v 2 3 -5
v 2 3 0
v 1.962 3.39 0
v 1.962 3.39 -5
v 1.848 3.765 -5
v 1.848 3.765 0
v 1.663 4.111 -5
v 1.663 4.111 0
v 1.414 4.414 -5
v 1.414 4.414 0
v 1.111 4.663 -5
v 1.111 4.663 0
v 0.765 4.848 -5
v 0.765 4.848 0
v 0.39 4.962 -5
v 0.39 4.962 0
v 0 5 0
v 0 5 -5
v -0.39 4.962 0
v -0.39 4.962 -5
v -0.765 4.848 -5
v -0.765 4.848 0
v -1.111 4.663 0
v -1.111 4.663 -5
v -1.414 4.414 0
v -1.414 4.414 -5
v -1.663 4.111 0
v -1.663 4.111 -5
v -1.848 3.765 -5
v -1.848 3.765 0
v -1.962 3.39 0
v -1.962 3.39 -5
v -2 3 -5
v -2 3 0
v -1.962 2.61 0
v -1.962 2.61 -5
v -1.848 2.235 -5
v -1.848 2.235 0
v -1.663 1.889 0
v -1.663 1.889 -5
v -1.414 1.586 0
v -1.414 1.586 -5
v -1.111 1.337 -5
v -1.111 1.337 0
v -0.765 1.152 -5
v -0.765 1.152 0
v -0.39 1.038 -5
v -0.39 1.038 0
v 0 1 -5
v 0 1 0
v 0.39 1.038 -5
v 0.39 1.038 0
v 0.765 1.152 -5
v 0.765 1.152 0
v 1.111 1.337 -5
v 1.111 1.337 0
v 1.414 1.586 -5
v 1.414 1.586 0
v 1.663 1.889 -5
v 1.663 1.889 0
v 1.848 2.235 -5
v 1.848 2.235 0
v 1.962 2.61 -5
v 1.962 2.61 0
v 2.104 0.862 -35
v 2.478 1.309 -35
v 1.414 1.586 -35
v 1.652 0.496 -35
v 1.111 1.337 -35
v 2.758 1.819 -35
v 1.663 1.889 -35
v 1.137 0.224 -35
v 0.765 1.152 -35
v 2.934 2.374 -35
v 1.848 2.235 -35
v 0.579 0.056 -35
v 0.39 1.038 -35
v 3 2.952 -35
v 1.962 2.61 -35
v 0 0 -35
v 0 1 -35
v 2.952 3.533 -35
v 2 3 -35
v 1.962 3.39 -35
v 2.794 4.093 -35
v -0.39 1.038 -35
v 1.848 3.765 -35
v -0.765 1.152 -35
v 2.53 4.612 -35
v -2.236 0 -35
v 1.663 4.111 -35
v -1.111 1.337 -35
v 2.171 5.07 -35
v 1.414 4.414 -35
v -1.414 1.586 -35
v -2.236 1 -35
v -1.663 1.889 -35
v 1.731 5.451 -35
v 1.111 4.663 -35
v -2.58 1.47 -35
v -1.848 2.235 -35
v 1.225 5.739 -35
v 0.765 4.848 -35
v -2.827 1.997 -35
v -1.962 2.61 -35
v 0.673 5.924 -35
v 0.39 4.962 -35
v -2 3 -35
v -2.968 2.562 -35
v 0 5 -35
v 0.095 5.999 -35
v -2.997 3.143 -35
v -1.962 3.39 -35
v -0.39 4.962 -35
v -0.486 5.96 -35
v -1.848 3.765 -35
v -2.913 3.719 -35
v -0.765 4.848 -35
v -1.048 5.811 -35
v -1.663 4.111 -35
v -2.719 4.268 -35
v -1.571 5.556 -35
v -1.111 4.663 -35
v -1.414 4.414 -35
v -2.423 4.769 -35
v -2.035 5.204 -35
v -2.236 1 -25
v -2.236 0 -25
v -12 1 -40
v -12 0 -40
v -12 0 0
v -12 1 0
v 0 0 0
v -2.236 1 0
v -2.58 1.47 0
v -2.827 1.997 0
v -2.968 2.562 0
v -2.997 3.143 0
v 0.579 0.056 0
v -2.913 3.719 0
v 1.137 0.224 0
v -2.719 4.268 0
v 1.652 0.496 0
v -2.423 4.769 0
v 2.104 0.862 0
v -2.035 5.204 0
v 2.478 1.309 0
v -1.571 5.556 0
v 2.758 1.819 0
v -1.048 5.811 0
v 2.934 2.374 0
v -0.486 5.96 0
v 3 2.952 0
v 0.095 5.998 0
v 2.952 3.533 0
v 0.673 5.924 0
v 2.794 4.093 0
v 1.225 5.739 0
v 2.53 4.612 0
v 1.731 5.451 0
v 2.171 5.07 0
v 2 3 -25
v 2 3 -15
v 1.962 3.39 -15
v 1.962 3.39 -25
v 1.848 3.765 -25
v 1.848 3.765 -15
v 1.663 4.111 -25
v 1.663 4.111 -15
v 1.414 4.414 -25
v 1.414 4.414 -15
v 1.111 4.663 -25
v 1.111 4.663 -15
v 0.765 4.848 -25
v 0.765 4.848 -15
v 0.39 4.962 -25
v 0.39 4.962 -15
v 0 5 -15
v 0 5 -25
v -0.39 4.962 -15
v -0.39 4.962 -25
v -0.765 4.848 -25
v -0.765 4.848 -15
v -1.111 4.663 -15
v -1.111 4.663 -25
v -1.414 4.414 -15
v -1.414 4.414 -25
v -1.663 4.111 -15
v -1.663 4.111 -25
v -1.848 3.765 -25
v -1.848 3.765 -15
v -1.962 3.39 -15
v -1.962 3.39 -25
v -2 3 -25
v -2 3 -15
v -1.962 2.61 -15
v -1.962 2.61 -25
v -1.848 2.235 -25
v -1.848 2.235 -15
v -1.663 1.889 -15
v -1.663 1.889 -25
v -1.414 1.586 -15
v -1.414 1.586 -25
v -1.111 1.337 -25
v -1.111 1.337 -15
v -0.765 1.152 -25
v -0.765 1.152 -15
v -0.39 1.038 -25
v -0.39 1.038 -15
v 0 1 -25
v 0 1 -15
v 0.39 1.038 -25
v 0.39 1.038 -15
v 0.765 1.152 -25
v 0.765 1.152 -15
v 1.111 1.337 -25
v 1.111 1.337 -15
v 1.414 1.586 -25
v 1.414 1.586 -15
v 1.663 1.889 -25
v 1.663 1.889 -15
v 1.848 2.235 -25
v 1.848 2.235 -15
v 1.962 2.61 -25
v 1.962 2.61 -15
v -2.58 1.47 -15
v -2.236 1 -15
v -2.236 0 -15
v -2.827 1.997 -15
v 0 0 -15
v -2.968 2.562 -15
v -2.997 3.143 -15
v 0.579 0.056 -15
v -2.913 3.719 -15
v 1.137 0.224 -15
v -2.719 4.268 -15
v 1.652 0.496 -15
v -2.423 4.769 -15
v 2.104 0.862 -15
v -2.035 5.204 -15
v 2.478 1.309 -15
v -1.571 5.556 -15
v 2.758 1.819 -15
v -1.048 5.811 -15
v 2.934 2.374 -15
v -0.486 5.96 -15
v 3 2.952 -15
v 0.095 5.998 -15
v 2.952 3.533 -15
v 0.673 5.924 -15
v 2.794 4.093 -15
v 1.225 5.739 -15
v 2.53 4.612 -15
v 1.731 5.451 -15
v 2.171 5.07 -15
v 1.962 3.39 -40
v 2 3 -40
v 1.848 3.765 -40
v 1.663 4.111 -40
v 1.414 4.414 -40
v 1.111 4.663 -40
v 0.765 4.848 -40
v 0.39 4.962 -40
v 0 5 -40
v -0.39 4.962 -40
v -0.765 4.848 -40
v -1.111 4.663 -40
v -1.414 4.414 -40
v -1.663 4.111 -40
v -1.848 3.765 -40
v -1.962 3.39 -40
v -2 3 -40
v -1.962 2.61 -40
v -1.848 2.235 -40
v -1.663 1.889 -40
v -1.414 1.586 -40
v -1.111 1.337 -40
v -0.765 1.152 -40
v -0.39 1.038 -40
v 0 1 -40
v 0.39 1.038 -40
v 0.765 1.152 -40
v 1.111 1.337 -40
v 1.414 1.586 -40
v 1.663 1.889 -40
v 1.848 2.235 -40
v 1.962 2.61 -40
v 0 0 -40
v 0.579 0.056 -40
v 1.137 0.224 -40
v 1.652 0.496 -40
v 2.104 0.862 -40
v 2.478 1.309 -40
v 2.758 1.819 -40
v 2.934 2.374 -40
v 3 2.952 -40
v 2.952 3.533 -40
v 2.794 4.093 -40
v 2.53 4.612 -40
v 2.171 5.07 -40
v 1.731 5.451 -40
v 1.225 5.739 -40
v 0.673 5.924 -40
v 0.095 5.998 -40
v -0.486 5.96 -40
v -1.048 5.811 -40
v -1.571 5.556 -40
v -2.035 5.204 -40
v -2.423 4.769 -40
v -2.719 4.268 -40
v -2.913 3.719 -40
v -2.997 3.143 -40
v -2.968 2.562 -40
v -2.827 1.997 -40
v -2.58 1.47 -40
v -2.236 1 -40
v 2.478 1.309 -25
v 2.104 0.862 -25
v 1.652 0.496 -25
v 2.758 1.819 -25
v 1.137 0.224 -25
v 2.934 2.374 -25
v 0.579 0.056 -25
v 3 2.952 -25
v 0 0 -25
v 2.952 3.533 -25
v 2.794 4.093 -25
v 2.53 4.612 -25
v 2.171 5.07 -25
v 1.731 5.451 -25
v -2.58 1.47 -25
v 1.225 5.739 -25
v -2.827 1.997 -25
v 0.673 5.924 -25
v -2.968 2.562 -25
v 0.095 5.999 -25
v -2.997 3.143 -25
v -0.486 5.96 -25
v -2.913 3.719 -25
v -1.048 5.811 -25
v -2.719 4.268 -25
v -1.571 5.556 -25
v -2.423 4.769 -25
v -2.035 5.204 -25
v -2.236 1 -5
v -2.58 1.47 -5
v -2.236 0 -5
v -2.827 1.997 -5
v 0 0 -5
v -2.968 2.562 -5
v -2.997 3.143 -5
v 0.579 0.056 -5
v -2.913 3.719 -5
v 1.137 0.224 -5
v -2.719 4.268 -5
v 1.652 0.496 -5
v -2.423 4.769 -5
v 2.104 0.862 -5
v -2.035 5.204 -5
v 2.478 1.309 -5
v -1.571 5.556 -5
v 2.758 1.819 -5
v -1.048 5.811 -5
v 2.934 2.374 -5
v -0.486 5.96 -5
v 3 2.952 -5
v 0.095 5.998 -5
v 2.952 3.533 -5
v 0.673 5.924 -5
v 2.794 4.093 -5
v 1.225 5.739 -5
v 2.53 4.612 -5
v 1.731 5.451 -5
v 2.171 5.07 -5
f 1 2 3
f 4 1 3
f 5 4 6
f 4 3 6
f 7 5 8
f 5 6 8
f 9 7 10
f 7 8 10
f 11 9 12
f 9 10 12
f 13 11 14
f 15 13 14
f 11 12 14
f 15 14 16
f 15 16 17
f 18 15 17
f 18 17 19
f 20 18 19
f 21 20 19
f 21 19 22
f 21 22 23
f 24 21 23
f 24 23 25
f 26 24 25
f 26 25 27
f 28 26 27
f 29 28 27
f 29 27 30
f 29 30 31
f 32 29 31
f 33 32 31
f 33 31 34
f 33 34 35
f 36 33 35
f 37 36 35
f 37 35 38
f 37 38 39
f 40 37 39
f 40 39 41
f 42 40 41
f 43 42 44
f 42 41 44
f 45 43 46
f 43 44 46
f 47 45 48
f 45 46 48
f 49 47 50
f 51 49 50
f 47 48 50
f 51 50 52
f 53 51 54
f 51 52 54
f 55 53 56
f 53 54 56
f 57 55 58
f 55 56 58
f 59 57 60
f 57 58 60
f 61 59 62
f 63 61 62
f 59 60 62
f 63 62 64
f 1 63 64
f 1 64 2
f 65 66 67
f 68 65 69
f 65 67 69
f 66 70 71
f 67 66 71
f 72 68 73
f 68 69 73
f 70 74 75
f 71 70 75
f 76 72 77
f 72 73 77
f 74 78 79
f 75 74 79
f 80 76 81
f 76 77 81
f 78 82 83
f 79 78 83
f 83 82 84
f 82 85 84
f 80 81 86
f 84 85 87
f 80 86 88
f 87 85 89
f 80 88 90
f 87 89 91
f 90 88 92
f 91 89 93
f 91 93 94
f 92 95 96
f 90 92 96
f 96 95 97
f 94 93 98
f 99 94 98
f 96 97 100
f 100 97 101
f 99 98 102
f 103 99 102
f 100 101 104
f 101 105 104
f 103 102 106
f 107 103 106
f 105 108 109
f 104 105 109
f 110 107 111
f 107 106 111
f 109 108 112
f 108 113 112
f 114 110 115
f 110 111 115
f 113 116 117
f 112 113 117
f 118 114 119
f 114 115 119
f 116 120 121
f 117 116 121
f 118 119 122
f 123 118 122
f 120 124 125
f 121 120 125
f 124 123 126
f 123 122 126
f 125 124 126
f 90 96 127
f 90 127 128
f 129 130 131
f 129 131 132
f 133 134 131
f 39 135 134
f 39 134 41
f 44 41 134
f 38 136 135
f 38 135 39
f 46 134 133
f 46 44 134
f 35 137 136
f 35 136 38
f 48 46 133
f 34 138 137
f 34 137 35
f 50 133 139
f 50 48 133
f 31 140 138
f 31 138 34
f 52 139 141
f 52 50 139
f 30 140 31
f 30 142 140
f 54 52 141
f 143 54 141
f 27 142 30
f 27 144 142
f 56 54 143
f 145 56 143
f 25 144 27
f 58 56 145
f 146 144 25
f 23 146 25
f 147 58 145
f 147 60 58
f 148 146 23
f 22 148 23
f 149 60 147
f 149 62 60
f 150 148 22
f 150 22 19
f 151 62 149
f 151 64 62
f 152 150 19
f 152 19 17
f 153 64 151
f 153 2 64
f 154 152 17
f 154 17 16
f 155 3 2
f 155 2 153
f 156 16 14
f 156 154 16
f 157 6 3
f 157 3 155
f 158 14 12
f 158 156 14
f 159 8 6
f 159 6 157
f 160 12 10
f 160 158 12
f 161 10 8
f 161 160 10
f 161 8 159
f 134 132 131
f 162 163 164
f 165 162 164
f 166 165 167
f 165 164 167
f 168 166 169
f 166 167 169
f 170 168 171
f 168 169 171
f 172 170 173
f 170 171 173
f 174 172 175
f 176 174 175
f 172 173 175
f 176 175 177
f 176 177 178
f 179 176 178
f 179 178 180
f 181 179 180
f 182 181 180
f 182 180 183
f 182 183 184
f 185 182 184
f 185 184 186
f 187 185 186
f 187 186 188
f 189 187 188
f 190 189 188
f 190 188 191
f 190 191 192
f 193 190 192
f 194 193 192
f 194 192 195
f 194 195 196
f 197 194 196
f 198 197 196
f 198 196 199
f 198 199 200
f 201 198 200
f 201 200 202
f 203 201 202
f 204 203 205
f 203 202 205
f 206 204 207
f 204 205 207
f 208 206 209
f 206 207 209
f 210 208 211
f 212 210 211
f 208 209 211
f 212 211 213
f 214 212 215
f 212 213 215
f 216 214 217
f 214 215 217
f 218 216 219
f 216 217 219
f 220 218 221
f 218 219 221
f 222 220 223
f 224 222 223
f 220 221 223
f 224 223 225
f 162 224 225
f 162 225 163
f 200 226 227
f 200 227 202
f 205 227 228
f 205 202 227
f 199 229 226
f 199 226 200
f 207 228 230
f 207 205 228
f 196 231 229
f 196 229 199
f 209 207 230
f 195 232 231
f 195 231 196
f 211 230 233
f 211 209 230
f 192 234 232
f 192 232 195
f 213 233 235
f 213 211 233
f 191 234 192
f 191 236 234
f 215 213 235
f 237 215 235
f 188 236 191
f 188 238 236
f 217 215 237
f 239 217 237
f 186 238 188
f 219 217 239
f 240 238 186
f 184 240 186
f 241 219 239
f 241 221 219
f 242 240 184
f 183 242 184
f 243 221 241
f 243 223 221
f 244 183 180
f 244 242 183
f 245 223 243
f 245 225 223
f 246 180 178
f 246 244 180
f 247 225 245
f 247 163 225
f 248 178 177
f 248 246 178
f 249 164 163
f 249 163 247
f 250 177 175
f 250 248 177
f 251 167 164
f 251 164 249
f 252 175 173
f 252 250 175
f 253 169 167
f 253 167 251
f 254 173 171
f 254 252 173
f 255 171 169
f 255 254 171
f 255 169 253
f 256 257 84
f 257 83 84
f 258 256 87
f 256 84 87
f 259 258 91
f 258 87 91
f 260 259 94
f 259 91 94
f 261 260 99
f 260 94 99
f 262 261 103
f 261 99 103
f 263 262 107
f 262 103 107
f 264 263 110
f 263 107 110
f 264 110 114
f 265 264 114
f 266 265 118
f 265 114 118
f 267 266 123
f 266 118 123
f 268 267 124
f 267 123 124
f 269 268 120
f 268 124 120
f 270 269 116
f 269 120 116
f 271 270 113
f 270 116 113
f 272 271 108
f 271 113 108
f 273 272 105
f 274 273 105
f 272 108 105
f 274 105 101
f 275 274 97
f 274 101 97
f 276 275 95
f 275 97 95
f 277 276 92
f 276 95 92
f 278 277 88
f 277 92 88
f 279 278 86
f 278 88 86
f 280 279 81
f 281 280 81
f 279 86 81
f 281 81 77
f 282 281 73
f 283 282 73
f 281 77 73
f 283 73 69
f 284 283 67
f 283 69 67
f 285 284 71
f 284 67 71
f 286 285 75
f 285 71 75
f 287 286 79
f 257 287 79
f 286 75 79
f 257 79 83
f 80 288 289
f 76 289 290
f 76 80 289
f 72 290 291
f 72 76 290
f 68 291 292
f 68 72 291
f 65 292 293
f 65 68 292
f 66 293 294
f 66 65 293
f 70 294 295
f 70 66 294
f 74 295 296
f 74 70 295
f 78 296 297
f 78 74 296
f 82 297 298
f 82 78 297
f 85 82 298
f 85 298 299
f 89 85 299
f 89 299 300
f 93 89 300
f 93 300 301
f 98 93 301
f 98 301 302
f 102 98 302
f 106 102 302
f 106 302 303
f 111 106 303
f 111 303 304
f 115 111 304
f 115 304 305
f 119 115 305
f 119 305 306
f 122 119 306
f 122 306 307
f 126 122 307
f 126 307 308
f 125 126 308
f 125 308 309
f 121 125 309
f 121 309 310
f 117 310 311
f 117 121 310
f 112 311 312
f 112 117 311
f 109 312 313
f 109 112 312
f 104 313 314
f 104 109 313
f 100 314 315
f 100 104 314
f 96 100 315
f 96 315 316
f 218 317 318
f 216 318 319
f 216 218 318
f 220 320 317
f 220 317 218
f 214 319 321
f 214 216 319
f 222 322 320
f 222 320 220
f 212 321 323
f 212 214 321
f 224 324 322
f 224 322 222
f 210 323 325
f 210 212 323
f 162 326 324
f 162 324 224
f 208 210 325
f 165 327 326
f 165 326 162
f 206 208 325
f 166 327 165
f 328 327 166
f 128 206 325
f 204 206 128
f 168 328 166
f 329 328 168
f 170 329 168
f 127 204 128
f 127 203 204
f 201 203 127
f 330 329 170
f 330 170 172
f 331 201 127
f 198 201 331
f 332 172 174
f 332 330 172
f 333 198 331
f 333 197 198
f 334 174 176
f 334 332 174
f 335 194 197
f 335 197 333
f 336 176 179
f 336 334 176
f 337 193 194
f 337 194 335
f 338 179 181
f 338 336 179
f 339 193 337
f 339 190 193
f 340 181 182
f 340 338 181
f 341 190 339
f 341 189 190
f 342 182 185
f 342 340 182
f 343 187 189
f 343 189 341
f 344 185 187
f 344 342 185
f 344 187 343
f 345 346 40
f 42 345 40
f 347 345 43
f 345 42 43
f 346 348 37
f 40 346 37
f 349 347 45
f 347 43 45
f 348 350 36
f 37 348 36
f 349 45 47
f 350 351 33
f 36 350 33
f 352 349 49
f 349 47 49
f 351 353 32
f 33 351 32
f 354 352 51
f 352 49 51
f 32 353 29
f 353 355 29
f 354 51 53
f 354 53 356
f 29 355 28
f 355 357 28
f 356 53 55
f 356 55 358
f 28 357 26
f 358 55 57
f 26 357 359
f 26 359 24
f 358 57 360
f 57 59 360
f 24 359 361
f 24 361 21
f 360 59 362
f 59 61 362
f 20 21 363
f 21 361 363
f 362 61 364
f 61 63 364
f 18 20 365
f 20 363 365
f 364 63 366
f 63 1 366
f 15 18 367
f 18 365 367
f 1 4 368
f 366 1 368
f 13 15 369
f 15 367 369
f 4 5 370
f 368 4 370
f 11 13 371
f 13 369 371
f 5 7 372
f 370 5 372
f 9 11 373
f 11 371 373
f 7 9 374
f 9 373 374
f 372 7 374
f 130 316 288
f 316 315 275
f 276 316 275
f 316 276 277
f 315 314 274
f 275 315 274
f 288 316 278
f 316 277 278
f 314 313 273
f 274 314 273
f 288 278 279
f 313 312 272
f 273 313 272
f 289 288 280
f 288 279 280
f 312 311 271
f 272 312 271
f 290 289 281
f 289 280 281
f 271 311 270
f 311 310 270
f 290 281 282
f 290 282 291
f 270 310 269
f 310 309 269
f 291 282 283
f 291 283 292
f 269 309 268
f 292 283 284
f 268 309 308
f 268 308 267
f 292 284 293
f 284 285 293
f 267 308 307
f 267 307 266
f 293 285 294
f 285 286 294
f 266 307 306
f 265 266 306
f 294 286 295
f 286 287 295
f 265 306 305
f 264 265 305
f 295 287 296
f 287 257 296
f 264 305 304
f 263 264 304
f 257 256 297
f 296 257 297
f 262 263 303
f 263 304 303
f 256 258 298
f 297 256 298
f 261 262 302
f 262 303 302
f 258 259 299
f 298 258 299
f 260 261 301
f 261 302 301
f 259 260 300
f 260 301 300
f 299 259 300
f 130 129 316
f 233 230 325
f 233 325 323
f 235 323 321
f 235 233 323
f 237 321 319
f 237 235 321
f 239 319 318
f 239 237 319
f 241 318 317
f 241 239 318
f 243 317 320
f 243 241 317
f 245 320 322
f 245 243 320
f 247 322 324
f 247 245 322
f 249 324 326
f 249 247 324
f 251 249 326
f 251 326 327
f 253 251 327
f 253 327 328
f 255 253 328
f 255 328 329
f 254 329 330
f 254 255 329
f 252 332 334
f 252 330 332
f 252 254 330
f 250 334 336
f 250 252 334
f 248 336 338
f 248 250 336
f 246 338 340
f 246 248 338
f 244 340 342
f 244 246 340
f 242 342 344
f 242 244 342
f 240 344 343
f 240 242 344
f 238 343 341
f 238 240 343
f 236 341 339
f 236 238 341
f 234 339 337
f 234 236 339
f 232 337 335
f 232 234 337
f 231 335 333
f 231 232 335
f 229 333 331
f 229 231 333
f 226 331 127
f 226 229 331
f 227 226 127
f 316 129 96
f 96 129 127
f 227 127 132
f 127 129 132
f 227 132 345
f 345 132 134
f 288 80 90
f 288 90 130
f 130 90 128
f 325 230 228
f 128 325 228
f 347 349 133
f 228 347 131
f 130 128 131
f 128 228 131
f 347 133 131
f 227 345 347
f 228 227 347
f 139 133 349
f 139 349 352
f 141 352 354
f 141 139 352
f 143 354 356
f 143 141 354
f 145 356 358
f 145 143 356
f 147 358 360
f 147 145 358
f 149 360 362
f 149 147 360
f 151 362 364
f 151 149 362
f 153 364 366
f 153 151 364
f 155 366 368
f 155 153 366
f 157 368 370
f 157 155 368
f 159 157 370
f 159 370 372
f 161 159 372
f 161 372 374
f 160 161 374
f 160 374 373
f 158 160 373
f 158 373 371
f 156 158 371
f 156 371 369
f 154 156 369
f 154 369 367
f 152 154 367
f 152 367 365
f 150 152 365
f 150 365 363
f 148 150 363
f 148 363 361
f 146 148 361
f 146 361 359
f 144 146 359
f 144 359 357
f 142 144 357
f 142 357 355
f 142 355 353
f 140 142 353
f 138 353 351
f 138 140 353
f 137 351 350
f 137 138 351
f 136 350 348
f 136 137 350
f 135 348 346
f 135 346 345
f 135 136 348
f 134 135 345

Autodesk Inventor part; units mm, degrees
ref_plane "YZ Plane" through (0, 0, 0) normal (1, 0, 0) x (0, 1, 0)
sketch "Sketch1" plane through (0, 0, 0) normal (0, 0, 1) x (1, 0, 0)
  line L0 (0, 0) -> (-12, 0)
  line L1 (-12, 0) -> (-12, 1)
  line L2 (-12, 1) -> (-2.2361, 1)
  arc A0 (0, 0) -> (-2.2361, 1) centre (0, 3) ccw
  circle A1 centre (0, 3) radius 2
  dimension "d1" = 1
  dimension "d2" = 6
  dimension "d3" = 4
  dimension "d4" = 12
extrude "Extrusion1" add sketch "Sketch1" against normal blind 40
ref_plane "Work Plane1" through (0, 0, -5) normal (0, 0, 1) x (1, 0, 0)
sketch "Sketch3" plane through (0, 0, -5) normal (0, 0, 1) x (1, 0, 0)
  arc A0 (0, 0) -> (-2.2361, 1) centre (0, 3) ccw projected
  arc A1 (0, 0) -> (-2.2361, 1) centre (0, 3) ccw projected
  line L0 (-2.2361, 1) -> (-2.2361, 0)
  line L1 (-2.2361, 0) -> (0, 0)
  circle A2 centre (0, 3) radius 2 projected
  circle A3 centre (0, 3) radius 2 projected
  point P0 (-2.2361, 1)
extrude "Extrusion2" cut sketch "Sketch3" against normal blind 10
ref_plane "Work Plane2" through (0, 0, -35) normal (0, 0, -1) x (-1, 0, 0)
sketch "Sketch4" plane through (0, 0, -35) normal (0, 0, -1) x (-1, 0, 0)
  arc A0 (2.2361, 1) -> (0, 0) centre (0, 3) ccw projected
  arc A1 (2.2361, 1) -> (0, 0) centre (0, 3) ccw projected
  circle A2 centre (0, 3) radius 2 projected
  circle A3 centre (0, 3) radius 2 projected
  line L0 (2.2361, 1) -> (2.2361, 0)
  line L1 (2.2361, 0) -> (0, 0)
  point P0 (2.2361, 1)
extrude "Extrusion3" cut sketch "Sketch4" against normal blind 10
properties part number "Poker hinge 1"
